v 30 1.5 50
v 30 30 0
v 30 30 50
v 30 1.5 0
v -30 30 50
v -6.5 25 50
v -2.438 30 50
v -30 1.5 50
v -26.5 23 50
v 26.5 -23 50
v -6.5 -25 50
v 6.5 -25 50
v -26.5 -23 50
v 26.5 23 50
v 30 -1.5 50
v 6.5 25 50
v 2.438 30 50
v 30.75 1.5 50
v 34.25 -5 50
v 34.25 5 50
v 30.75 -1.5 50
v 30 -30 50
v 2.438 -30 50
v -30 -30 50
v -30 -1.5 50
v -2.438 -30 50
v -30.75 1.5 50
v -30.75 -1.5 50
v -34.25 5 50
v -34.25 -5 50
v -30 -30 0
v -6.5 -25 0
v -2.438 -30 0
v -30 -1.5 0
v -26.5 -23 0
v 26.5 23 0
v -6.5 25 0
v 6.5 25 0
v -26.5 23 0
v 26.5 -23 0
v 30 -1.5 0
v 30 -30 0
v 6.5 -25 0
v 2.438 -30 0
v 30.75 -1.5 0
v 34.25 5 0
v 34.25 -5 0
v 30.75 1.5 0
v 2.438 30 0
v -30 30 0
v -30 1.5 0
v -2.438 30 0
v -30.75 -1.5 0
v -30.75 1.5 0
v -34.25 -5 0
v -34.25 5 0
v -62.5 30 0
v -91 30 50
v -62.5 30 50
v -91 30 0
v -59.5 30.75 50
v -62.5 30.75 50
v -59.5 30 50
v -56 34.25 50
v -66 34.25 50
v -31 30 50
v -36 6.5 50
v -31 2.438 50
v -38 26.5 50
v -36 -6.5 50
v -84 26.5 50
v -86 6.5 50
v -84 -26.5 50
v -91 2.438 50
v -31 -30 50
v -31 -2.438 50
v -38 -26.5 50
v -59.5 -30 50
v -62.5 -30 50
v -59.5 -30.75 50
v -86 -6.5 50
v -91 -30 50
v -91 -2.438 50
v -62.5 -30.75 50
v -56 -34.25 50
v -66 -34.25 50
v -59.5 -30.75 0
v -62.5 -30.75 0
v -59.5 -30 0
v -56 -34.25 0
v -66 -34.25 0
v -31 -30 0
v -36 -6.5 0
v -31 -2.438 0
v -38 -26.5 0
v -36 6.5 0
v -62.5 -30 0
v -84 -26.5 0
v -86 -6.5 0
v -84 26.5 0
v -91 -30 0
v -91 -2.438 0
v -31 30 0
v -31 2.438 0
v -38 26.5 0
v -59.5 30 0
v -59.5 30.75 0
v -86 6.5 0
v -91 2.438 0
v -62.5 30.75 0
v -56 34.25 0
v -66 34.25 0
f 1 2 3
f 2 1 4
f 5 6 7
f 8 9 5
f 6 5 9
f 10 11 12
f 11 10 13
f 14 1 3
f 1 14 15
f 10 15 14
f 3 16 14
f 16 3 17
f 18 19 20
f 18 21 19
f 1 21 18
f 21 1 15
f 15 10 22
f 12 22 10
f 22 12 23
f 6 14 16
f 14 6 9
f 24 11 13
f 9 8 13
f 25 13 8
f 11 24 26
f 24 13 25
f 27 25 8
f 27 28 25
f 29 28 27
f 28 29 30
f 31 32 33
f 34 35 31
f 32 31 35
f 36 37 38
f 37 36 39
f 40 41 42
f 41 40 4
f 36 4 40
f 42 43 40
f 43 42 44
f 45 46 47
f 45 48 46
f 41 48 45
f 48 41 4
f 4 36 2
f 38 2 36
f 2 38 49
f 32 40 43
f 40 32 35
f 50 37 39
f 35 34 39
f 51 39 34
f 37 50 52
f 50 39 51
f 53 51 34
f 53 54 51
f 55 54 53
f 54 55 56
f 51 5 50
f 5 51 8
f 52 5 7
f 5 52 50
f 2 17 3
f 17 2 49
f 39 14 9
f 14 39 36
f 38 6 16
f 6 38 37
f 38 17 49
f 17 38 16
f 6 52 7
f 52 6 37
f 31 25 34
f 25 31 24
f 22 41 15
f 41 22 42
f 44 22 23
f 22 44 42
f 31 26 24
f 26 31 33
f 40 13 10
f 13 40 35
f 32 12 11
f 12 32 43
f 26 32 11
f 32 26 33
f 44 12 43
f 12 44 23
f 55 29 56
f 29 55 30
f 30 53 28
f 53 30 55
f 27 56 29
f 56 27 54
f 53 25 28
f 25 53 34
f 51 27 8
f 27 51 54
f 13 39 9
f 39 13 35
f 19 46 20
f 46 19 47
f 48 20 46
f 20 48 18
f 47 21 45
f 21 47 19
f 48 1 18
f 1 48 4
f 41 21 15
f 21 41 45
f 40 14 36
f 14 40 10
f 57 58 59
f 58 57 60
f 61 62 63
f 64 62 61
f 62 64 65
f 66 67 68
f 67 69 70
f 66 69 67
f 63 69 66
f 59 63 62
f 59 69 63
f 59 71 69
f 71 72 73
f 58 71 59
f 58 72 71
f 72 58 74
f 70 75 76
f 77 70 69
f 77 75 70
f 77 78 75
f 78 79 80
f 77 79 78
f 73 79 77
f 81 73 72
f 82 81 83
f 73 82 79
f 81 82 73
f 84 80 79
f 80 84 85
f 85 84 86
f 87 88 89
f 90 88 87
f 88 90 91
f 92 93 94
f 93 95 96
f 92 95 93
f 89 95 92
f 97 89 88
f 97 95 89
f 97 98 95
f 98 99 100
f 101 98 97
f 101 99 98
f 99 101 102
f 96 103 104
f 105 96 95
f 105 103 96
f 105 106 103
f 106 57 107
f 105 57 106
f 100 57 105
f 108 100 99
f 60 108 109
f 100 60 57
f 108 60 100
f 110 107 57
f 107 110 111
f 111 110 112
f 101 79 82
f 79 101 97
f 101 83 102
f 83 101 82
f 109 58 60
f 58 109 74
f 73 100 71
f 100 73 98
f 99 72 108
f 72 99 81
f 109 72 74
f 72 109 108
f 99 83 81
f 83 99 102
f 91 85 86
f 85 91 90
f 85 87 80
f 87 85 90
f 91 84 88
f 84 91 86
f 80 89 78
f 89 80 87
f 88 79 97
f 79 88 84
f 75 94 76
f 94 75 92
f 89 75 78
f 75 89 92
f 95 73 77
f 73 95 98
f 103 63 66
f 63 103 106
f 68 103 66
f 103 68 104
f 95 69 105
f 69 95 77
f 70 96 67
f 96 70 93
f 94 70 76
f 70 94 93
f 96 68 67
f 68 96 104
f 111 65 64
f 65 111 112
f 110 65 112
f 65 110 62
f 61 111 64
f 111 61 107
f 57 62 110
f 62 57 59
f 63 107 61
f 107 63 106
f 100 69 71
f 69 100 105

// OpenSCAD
union() {
	translate(v = [0, 30.0000000000, 0]) {
		difference() {
			union() {
				translate(v = [0, -1.7500000000, 0]) {
					translate(v = [0, 0, 25.0000000000]) {
						cube(center = true, size = [60, 3.5000000000, 50]);
					}
				}
				translate(v = [0, -3.5000000000, 0]) {
					translate(v = [0, -1.7500000000, 0]) {
						translate(v = [0, 0, 25.0000000000]) {
							cube(center = true, size = [60, 3.5000000000, 50]);
						}
					}
				}
			}
			translate(v = [0, -1.0000000000, 0]) {
				translate(v = [0, -4.0000000000, 0]) {
					translate(v = [-6.5000000000, 0, 0]) {
						linear_extrude(height = 50) {
							polygon(points = [[0, 0], [13, 0], [6.5000000000, 8]]);
						}
					}
				}
			}
		}
	}
	rotate(a = [0, 0, 180]) {
		translate(v = [0, 30.0000000000, 0]) {
			difference() {
				union() {
					translate(v = [0, -1.7500000000, 0]) {
						translate(v = [0, 0, 25.0000000000]) {
							cube(center = true, size = [60, 3.5000000000, 50]);
						}
					}
					translate(v = [0, -3.5000000000, 0]) {
						translate(v = [0, -1.7500000000, 0]) {
							translate(v = [0, 0, 25.0000000000]) {
								cube(center = true, size = [60, 3.5000000000, 50]);
							}
						}
					}
				}
				translate(v = [0, -1.0000000000, 0]) {
					translate(v = [0, -4.0000000000, 0]) {
						translate(v = [-6.5000000000, 0, 0]) {
							linear_extrude(height = 50) {
								polygon(points = [[0, 0], [13, 0], [6.5000000000, 8]]);
							}
						}
					}
				}
			}
		}
	}
	translate(v = [-30.0000000000, 0, 0]) {
		rotate(a = [0, 0, 90]) {
			union() {
				translate(v = [0, -1.7500000000, 0]) {
					translate(v = [0, 0, 25.0000000000]) {
						cube(center = true, size = [60, 3.5000000000, 50]);
					}
				}
				translate(v = [0, 1.7500000000, 0]) {
					rotate(a = [0, 0, 180]) {
						union() {
							translate(v = [0, -2.5000000000, 0]) {
								translate(v = [-5.0000000000, 0, 0]) {
									linear_extrude(height = 50) {
										polygon(points = [[0, 0], [10, 0], [5.0000000000, 5]]);
									}
								}
							}
							translate(v = [0, 2.5000000000, 0]) {
								translate(v = [0, 0, 25.0000000000]) {
									cube(center = true, size = [3, 3, 50]);
								}
							}
						}
					}
				}
			}
		}
	}
	rotate(a = [0, 0, 180]) {
		translate(v = [-30.0000000000, 0, 0]) {
			rotate(a = [0, 0, 90]) {
				union() {
					translate(v = [0, -1.7500000000, 0]) {
						translate(v = [0, 0, 25.0000000000]) {
							cube(center = true, size = [60, 3.5000000000, 50]);
						}
					}
					translate(v = [0, 1.7500000000, 0]) {
						rotate(a = [0, 0, 180]) {
							union() {
								translate(v = [0, -2.5000000000, 0]) {
									translate(v = [-5.0000000000, 0, 0]) {
										linear_extrude(height = 50) {
											polygon(points = [[0, 0], [10, 0], [5.0000000000, 5]]);
										}
									}
								}
								translate(v = [0, 2.5000000000, 0]) {
									translate(v = [0, 0, 25.0000000000]) {
										cube(center = true, size = [3, 3, 50]);
									}
								}
							}
						}
					}
				}
			}
		}
	}
	translate(v = [-61, 0, 0]) {
		rotate(a = [0, 0, 90]) {
			union() {
				translate(v = [0, 30.0000000000, 0]) {
					difference() {
						union() {
							translate(v = [0, -1.7500000000, 0]) {
								translate(v = [0, 0, 25.0000000000]) {
									cube(center = true, size = [60, 3.5000000000, 50]);
								}
							}
							translate(v = [0, -3.5000000000, 0]) {
								translate(v = [0, -1.7500000000, 0]) {
									translate(v = [0, 0, 25.0000000000]) {
										cube(center = true, size = [60, 3.5000000000, 50]);
									}
								}
							}
						}
						translate(v = [0, -1.0000000000, 0]) {
							translate(v = [0, -4.0000000000, 0]) {
								translate(v = [-6.5000000000, 0, 0]) {
									linear_extrude(height = 50) {
										polygon(points = [[0, 0], [13, 0], [6.5000000000, 8]]);
									}
								}
							}
						}
					}
				}
				rotate(a = [0, 0, 180]) {
					translate(v = [0, 30.0000000000, 0]) {
						difference() {
							union() {
								translate(v = [0, -1.7500000000, 0]) {
									translate(v = [0, 0, 25.0000000000]) {
										cube(center = true, size = [60, 3.5000000000, 50]);
									}
								}
								translate(v = [0, -3.5000000000, 0]) {
									translate(v = [0, -1.7500000000, 0]) {
										translate(v = [0, 0, 25.0000000000]) {
											cube(center = true, size = [60, 3.5000000000, 50]);
										}
									}
								}
							}
							translate(v = [0, -1.0000000000, 0]) {
								translate(v = [0, -4.0000000000, 0]) {
									translate(v = [-6.5000000000, 0, 0]) {
										linear_extrude(height = 50) {
											polygon(points = [[0, 0], [13, 0], [6.5000000000, 8]]);
										}
									}
								}
							}
						}
					}
				}
				translate(v = [-30.0000000000, 0, 0]) {
					rotate(a = [0, 0, 90]) {
						union() {
							translate(v = [0, -1.7500000000, 0]) {
								translate(v = [0, 0, 25.0000000000]) {
									cube(center = true, size = [60, 3.5000000000, 50]);
								}
							}
							translate(v = [0, 1.7500000000, 0]) {
								rotate(a = [0, 0, 180]) {
									union() {
										translate(v = [0, -2.5000000000, 0]) {
											translate(v = [-5.0000000000, 0, 0]) {
												linear_extrude(height = 50) {
													polygon(points = [[0, 0], [10, 0], [5.0000000000, 5]]);
												}
											}
										}
										translate(v = [0, 2.5000000000, 0]) {
											translate(v = [0, 0, 25.0000000000]) {
												cube(center = true, size = [3, 3, 50]);
											}
										}
									}
								}
							}
						}
					}
				}
				rotate(a = [0, 0, 180]) {
					translate(v = [-30.0000000000, 0, 0]) {
						rotate(a = [0, 0, 90]) {
							union() {
								translate(v = [0, -1.7500000000, 0]) {
									translate(v = [0, 0, 25.0000000000]) {
										cube(center = true, size = [60, 3.5000000000, 50]);
									}
								}
								translate(v = [0, 1.7500000000, 0]) {
									rotate(a = [0, 0, 180]) {
										union() {
											translate(v = [0, -2.5000000000, 0]) {
												translate(v = [-5.0000000000, 0, 0]) {
													linear_extrude(height = 50) {
														polygon(points = [[0, 0], [10, 0], [5.0000000000, 5]]);
													}
												}
											}
											translate(v = [0, 2.5000000000, 0]) {
												translate(v = [0, 0, 25.0000000000]) {
													cube(center = true, size = [3, 3, 50]);
												}
											}
										}
									}
								}
							}
						}
					}
				}
			}
		}
	}
}
